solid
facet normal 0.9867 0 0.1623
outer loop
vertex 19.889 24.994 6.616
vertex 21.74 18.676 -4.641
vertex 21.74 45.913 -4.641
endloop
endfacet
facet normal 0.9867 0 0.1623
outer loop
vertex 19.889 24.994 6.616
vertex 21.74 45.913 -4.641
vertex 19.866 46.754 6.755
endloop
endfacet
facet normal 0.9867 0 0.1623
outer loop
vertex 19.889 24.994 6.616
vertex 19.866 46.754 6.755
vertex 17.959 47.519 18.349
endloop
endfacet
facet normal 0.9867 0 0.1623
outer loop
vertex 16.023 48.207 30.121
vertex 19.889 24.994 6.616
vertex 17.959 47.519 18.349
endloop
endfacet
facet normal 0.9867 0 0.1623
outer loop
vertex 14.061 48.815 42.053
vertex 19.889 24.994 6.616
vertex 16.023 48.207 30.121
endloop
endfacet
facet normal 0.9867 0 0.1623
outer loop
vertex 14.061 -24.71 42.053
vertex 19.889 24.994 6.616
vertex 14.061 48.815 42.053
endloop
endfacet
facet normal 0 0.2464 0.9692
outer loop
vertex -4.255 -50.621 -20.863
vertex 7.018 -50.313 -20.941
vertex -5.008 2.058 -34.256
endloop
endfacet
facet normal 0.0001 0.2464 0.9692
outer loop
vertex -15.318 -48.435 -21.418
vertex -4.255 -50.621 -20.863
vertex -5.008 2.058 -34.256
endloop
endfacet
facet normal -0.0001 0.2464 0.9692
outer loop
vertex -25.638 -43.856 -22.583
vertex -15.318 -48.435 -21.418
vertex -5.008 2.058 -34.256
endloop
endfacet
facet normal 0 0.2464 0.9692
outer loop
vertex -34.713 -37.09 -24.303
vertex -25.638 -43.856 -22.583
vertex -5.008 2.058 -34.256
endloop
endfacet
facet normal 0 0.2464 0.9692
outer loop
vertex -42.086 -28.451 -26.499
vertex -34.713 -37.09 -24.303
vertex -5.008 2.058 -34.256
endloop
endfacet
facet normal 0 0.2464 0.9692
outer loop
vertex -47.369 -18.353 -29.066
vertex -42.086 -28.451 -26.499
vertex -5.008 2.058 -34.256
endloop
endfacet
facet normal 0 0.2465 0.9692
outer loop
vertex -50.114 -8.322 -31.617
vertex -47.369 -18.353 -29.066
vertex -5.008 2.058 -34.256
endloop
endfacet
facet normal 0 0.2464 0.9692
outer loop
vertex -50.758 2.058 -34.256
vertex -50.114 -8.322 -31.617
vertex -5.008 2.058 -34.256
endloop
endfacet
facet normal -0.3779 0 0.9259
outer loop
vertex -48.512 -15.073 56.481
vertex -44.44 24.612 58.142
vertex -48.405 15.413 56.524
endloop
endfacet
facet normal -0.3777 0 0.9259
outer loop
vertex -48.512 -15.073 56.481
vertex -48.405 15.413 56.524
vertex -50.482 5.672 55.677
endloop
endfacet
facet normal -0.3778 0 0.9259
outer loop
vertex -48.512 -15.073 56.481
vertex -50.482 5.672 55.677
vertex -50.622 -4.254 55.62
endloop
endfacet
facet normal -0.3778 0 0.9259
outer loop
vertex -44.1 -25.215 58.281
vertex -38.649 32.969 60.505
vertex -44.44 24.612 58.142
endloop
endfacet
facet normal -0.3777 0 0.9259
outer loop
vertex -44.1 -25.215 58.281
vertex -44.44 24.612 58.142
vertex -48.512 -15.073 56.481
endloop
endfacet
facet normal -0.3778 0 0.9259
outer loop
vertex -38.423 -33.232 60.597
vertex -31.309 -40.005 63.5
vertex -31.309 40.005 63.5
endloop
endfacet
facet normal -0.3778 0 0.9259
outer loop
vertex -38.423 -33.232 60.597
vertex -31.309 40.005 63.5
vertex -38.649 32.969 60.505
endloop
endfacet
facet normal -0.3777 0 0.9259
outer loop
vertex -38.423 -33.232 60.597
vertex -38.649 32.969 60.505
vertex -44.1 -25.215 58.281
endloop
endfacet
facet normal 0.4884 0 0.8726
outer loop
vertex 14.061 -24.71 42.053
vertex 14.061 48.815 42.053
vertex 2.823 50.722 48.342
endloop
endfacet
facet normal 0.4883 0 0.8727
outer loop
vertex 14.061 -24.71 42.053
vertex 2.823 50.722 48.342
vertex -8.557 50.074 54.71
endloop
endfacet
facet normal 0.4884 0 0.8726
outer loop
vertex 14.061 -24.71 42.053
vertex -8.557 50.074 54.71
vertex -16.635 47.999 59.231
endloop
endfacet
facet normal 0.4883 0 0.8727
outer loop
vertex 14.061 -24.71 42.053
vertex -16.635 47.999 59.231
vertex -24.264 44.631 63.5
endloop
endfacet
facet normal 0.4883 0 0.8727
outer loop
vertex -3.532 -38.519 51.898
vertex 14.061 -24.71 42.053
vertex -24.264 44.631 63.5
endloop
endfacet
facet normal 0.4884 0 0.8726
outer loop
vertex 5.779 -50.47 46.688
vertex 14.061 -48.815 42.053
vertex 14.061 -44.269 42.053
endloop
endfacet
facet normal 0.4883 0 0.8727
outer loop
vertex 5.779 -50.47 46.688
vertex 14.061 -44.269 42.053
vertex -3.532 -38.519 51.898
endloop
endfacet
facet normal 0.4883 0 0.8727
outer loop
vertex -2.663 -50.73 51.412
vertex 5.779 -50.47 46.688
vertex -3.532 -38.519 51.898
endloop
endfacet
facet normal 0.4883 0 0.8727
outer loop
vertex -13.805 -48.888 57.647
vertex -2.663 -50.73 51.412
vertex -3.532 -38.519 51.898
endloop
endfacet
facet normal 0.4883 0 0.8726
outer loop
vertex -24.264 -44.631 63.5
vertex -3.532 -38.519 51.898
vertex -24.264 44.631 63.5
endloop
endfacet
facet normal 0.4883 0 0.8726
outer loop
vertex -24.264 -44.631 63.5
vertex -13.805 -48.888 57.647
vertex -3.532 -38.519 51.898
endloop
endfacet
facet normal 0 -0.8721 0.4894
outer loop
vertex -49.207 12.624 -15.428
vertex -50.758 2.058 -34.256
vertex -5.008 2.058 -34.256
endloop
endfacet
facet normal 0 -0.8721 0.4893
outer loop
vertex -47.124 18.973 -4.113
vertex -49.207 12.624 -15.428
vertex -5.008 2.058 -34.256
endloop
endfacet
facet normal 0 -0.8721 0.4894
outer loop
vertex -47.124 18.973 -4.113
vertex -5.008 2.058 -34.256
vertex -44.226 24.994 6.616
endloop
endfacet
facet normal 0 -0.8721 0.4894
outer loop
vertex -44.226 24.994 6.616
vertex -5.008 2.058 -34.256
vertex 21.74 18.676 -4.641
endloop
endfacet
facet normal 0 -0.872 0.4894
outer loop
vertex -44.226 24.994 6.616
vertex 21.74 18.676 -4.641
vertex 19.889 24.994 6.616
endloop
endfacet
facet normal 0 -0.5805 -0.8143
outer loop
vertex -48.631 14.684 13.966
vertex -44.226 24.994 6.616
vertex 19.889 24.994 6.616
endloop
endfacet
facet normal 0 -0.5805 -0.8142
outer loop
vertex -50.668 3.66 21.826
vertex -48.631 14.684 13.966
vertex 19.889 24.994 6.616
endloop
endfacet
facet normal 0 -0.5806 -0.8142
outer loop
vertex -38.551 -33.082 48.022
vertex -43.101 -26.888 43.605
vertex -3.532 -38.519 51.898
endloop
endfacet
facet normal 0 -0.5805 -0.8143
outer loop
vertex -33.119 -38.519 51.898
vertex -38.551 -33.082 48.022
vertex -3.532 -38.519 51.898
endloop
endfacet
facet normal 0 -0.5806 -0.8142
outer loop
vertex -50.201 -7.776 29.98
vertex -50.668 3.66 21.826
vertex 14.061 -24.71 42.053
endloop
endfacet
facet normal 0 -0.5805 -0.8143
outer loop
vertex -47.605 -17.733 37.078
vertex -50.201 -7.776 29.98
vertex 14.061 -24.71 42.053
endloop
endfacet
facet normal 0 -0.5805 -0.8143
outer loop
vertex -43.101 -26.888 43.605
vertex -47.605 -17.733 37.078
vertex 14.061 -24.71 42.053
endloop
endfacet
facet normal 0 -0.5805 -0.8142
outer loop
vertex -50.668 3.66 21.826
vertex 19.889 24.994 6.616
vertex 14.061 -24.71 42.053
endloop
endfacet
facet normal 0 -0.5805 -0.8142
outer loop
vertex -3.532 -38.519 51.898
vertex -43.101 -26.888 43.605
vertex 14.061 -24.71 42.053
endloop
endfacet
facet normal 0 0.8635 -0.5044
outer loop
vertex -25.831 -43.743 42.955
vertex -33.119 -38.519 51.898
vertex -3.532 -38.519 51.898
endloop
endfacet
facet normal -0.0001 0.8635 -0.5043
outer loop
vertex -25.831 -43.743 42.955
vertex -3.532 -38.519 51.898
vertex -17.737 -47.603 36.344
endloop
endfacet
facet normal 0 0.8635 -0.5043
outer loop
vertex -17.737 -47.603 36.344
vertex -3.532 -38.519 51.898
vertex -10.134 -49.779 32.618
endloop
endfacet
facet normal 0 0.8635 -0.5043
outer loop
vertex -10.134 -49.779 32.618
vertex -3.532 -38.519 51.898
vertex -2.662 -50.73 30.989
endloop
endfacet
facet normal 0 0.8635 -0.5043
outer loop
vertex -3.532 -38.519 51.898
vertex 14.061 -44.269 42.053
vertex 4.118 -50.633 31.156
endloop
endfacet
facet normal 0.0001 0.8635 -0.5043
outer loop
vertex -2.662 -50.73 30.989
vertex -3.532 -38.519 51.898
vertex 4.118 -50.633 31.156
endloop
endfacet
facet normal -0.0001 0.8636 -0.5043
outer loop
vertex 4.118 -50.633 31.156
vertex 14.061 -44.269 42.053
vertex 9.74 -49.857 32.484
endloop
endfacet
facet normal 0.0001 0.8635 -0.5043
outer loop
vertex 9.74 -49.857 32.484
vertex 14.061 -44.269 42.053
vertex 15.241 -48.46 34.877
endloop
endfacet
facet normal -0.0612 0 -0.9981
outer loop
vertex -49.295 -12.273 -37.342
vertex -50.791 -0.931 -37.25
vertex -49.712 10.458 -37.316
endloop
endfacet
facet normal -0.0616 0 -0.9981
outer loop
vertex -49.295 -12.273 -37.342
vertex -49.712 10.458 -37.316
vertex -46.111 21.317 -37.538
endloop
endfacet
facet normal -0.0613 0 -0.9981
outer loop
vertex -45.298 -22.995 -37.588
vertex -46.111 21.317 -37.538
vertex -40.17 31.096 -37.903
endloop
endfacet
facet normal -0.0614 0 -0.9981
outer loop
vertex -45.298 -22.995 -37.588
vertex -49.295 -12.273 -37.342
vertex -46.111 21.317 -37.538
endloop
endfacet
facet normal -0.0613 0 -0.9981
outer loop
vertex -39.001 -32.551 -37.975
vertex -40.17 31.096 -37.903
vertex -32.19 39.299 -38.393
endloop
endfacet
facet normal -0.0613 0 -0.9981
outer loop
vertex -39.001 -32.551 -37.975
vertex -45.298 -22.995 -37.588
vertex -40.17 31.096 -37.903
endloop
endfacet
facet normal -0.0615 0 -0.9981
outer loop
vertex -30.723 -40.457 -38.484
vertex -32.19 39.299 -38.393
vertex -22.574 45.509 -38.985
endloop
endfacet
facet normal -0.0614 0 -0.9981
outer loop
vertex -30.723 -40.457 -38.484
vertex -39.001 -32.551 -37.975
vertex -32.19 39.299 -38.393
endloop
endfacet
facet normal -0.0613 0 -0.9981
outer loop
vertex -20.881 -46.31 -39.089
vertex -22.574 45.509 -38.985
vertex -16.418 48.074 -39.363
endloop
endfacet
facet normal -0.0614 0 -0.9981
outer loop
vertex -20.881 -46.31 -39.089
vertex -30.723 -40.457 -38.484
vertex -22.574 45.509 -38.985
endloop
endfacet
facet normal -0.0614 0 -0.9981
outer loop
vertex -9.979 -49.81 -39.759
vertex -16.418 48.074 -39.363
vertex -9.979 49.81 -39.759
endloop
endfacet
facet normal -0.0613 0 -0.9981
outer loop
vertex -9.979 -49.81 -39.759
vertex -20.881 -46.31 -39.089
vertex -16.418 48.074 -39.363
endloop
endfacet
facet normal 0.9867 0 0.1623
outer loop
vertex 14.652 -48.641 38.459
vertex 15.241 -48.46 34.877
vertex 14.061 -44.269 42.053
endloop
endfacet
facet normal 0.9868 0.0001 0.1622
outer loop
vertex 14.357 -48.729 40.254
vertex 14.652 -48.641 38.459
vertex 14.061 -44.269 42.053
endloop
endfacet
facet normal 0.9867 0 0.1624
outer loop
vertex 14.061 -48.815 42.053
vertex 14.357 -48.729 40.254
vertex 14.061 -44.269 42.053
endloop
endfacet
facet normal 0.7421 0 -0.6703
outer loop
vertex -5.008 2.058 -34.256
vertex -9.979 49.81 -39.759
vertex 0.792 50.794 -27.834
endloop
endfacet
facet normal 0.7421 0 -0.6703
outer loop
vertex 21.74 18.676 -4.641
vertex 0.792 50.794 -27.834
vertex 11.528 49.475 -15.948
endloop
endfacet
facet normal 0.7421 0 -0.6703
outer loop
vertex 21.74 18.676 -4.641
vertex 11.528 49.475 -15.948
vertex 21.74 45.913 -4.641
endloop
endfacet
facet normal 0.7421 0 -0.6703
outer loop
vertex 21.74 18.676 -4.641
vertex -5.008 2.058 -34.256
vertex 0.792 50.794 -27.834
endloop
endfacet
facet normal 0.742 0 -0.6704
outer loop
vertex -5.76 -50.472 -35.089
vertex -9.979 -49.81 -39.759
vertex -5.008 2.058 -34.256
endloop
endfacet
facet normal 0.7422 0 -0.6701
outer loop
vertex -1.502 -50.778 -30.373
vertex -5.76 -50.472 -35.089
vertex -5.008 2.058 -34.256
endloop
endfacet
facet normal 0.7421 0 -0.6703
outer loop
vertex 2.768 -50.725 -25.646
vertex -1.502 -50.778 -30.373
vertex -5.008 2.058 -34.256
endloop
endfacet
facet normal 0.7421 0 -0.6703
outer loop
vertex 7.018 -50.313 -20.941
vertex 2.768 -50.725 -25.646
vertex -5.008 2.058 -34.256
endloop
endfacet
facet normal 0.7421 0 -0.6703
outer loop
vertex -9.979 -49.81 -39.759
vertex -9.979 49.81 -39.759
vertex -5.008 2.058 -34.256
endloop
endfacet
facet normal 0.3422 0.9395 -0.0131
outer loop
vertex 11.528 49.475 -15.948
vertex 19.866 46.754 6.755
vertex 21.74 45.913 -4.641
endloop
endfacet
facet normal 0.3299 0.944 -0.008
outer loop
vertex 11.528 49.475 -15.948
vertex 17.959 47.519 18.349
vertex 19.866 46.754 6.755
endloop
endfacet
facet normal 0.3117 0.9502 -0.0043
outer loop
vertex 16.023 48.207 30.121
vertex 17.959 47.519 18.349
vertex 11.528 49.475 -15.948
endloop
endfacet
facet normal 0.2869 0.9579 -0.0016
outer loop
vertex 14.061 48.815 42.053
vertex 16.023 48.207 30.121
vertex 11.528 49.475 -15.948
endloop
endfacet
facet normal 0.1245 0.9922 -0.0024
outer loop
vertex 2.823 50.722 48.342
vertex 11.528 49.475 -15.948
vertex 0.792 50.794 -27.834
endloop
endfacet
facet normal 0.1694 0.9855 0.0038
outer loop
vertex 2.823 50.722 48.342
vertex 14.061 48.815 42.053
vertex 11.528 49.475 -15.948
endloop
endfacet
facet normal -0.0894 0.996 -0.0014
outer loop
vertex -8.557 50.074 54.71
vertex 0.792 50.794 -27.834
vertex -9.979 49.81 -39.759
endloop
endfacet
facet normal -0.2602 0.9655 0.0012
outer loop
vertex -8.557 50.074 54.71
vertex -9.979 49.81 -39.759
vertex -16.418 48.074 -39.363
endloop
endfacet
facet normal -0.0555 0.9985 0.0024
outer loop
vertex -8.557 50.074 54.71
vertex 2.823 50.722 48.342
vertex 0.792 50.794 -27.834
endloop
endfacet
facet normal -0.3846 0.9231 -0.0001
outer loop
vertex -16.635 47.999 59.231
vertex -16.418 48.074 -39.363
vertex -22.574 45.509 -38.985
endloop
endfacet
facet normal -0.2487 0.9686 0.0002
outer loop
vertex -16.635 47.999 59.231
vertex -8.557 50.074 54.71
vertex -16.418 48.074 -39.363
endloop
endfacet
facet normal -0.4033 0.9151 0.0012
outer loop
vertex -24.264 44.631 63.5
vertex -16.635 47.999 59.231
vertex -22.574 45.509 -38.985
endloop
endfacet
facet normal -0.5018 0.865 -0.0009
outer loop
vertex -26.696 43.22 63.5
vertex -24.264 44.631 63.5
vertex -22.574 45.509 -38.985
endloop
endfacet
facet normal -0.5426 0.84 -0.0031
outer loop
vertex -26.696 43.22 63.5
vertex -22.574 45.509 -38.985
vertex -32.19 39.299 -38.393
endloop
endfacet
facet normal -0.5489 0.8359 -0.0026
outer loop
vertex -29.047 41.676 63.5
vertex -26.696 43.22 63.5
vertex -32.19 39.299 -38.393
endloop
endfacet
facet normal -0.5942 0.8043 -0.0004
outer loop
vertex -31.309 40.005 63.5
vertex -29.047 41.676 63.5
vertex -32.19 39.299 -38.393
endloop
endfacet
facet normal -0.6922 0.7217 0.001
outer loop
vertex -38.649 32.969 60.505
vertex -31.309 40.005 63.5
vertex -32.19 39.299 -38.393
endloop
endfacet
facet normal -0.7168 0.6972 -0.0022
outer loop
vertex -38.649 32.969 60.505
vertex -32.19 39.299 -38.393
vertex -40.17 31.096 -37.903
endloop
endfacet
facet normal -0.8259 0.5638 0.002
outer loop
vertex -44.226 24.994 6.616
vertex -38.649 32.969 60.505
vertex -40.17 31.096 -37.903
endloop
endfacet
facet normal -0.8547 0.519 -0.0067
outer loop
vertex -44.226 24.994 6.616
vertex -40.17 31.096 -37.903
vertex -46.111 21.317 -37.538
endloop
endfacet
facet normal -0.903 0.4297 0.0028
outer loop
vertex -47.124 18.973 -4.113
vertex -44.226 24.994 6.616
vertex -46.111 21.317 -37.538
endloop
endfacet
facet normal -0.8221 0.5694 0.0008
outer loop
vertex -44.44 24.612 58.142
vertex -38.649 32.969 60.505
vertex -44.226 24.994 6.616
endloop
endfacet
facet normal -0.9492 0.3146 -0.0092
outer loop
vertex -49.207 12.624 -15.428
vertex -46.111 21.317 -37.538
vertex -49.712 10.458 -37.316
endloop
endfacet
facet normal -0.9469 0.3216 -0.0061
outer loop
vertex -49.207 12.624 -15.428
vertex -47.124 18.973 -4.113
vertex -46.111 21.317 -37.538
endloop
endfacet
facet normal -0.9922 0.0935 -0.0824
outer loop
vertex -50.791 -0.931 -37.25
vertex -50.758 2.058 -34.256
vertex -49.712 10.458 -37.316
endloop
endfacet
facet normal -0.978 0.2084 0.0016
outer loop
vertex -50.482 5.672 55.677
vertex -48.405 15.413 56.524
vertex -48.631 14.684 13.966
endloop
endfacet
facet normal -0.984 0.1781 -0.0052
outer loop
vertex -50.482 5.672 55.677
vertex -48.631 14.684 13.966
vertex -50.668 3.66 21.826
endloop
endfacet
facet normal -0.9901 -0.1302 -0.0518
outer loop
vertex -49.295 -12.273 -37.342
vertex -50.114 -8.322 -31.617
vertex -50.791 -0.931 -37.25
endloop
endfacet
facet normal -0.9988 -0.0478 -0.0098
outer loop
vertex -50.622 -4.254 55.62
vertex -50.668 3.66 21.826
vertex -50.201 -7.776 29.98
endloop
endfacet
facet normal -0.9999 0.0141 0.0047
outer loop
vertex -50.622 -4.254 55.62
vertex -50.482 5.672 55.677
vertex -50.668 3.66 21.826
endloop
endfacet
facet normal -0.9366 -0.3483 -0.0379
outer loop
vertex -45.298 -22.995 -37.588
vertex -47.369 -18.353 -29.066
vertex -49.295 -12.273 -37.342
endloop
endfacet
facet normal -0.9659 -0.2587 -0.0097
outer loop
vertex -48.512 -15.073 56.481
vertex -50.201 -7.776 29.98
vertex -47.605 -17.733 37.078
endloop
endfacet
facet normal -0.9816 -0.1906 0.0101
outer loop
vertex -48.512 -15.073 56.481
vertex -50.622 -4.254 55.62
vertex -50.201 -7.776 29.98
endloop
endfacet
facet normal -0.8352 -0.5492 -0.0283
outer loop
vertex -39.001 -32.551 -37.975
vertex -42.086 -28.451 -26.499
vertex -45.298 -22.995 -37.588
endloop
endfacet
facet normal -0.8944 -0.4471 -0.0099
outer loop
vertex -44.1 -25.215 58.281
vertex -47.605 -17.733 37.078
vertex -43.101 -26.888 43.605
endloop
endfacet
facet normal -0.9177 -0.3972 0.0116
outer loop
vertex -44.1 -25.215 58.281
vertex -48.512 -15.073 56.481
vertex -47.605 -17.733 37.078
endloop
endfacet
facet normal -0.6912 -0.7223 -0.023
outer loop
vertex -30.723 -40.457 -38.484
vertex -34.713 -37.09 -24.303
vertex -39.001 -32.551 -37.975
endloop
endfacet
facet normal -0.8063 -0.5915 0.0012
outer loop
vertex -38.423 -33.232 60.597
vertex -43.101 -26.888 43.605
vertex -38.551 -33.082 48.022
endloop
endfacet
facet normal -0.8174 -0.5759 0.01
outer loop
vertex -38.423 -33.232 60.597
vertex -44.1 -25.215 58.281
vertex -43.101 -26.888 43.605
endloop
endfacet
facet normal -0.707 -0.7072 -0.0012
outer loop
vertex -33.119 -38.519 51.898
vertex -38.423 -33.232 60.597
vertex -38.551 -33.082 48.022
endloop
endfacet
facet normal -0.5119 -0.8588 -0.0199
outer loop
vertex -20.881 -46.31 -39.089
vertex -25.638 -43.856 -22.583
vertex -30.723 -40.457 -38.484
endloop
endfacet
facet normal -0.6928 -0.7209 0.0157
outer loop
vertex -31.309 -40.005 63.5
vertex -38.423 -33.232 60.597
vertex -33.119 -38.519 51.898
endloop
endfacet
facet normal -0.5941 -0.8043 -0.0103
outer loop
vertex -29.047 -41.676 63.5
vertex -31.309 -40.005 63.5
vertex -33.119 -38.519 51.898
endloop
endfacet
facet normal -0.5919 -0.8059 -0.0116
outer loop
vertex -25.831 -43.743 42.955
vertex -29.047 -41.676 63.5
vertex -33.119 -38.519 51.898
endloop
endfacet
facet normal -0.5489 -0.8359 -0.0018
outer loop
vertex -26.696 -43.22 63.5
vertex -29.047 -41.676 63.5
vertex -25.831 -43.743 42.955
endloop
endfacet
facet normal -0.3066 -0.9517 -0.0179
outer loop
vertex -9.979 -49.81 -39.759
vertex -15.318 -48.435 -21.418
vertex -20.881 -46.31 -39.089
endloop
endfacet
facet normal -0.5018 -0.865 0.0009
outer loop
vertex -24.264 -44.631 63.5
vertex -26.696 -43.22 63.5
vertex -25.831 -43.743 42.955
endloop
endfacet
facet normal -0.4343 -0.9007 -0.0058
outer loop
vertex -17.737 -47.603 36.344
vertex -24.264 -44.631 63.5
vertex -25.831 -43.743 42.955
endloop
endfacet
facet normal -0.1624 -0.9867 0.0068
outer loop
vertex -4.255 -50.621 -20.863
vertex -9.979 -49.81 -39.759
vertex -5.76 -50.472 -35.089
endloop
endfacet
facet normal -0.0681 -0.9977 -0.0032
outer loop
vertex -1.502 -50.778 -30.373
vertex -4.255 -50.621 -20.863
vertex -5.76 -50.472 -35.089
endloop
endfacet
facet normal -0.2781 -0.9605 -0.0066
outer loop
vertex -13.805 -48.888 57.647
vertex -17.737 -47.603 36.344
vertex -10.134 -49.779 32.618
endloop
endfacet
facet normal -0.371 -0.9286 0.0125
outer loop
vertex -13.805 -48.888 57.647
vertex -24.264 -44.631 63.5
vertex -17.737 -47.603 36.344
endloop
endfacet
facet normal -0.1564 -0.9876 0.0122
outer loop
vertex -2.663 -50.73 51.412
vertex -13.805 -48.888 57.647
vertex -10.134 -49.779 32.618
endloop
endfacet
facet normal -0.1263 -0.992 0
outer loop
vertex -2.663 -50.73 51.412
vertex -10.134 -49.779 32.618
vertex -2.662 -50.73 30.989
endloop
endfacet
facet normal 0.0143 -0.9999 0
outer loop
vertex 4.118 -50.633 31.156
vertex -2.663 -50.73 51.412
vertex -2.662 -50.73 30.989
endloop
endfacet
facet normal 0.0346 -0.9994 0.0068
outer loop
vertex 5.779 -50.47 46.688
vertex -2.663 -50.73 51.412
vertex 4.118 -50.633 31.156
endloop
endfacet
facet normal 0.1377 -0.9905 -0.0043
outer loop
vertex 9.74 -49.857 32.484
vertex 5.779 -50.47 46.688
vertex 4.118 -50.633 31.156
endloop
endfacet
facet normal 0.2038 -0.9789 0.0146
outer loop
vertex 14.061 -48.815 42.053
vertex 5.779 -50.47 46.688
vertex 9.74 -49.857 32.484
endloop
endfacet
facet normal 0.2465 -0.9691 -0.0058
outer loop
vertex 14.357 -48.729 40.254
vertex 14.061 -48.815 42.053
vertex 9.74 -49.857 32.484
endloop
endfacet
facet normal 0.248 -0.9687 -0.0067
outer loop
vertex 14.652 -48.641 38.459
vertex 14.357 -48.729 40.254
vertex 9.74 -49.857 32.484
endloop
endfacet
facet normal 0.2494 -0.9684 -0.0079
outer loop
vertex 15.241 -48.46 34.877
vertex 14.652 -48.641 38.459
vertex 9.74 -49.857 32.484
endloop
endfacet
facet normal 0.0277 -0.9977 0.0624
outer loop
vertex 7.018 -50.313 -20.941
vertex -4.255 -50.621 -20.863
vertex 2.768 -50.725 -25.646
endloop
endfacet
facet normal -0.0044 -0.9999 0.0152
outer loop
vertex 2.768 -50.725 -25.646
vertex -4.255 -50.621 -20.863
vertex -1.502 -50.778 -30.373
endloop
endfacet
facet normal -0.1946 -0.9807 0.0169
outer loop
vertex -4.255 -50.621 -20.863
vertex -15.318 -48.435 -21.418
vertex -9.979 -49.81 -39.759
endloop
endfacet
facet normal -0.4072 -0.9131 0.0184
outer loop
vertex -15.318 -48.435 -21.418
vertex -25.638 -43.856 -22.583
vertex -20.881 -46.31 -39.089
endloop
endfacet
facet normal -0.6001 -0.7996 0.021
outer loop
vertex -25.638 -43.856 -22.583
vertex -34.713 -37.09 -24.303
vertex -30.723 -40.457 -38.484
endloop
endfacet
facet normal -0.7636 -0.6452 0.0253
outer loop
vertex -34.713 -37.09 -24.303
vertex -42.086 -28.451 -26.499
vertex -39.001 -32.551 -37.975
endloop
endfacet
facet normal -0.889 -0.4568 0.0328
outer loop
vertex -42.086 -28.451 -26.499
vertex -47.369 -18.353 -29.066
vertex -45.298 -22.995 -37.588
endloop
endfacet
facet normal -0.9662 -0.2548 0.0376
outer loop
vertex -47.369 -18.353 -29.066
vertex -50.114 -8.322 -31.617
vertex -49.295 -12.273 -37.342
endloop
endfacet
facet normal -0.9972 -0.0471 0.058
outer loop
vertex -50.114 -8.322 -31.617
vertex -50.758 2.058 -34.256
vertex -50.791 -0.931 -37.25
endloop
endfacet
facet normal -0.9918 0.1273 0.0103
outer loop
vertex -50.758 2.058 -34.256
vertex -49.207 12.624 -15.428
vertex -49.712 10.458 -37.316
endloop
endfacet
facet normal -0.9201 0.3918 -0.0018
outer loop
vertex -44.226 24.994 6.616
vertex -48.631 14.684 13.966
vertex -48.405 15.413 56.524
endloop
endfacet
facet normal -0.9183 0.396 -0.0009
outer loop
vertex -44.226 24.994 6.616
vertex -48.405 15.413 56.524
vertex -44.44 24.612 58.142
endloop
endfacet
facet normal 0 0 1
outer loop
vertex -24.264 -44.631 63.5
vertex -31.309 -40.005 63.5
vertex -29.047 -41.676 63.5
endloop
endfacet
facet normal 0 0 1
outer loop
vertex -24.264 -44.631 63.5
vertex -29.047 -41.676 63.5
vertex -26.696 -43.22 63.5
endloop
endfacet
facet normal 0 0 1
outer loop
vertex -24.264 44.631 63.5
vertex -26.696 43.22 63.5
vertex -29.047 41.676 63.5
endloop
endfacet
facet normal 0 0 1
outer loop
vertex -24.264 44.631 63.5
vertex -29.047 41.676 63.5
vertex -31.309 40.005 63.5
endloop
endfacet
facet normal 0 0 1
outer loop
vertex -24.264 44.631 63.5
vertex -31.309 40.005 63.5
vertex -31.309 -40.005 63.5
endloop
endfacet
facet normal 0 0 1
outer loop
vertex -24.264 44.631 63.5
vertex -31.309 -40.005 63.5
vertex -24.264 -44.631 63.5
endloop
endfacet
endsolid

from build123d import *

# Parameters (mm, degrees)
F0_R     = 50.8
F1_DEPTH = 63.5
F3_DEPTH = 76.2
F5_DEPTH = 76.2


with BuildPart() as f1:
    # F0 (on Top) → F1 (new body, symmetric)
    with BuildSketch(Plane.XY):
        Circle(F0_R)
    extrude(amount=F1_DEPTH, both=True)

    # F2 (on Front) → F3 (intersect, symmetric)
    with BuildSketch(Plane.XZ):
        Polygon((-9.978701, -39.75891), (21.740365, -4.641373), (14.060883, 42.053018), (-27.234341, 65.162434), (-71.04916, 47.285013), (-84.390123, 1.882818), (-57.211212, -36.855372), align=None)
    extrude(amount=F3_DEPTH, both=True, mode=Mode.INTERSECT)

    # F4 (on Right) → F5 (cut, symmetric)
    with BuildSketch(Plane.YZ):
        Polygon((-38.51945, 51.898345), (-59.98449, 15.143144), (-67.335531, -16.613351), (2.058293, -34.255847), (24.993537, 6.615937), align=None)
    extrude(amount=F5_DEPTH, both=True, mode=Mode.SUBTRACT)


solid = f1.part
